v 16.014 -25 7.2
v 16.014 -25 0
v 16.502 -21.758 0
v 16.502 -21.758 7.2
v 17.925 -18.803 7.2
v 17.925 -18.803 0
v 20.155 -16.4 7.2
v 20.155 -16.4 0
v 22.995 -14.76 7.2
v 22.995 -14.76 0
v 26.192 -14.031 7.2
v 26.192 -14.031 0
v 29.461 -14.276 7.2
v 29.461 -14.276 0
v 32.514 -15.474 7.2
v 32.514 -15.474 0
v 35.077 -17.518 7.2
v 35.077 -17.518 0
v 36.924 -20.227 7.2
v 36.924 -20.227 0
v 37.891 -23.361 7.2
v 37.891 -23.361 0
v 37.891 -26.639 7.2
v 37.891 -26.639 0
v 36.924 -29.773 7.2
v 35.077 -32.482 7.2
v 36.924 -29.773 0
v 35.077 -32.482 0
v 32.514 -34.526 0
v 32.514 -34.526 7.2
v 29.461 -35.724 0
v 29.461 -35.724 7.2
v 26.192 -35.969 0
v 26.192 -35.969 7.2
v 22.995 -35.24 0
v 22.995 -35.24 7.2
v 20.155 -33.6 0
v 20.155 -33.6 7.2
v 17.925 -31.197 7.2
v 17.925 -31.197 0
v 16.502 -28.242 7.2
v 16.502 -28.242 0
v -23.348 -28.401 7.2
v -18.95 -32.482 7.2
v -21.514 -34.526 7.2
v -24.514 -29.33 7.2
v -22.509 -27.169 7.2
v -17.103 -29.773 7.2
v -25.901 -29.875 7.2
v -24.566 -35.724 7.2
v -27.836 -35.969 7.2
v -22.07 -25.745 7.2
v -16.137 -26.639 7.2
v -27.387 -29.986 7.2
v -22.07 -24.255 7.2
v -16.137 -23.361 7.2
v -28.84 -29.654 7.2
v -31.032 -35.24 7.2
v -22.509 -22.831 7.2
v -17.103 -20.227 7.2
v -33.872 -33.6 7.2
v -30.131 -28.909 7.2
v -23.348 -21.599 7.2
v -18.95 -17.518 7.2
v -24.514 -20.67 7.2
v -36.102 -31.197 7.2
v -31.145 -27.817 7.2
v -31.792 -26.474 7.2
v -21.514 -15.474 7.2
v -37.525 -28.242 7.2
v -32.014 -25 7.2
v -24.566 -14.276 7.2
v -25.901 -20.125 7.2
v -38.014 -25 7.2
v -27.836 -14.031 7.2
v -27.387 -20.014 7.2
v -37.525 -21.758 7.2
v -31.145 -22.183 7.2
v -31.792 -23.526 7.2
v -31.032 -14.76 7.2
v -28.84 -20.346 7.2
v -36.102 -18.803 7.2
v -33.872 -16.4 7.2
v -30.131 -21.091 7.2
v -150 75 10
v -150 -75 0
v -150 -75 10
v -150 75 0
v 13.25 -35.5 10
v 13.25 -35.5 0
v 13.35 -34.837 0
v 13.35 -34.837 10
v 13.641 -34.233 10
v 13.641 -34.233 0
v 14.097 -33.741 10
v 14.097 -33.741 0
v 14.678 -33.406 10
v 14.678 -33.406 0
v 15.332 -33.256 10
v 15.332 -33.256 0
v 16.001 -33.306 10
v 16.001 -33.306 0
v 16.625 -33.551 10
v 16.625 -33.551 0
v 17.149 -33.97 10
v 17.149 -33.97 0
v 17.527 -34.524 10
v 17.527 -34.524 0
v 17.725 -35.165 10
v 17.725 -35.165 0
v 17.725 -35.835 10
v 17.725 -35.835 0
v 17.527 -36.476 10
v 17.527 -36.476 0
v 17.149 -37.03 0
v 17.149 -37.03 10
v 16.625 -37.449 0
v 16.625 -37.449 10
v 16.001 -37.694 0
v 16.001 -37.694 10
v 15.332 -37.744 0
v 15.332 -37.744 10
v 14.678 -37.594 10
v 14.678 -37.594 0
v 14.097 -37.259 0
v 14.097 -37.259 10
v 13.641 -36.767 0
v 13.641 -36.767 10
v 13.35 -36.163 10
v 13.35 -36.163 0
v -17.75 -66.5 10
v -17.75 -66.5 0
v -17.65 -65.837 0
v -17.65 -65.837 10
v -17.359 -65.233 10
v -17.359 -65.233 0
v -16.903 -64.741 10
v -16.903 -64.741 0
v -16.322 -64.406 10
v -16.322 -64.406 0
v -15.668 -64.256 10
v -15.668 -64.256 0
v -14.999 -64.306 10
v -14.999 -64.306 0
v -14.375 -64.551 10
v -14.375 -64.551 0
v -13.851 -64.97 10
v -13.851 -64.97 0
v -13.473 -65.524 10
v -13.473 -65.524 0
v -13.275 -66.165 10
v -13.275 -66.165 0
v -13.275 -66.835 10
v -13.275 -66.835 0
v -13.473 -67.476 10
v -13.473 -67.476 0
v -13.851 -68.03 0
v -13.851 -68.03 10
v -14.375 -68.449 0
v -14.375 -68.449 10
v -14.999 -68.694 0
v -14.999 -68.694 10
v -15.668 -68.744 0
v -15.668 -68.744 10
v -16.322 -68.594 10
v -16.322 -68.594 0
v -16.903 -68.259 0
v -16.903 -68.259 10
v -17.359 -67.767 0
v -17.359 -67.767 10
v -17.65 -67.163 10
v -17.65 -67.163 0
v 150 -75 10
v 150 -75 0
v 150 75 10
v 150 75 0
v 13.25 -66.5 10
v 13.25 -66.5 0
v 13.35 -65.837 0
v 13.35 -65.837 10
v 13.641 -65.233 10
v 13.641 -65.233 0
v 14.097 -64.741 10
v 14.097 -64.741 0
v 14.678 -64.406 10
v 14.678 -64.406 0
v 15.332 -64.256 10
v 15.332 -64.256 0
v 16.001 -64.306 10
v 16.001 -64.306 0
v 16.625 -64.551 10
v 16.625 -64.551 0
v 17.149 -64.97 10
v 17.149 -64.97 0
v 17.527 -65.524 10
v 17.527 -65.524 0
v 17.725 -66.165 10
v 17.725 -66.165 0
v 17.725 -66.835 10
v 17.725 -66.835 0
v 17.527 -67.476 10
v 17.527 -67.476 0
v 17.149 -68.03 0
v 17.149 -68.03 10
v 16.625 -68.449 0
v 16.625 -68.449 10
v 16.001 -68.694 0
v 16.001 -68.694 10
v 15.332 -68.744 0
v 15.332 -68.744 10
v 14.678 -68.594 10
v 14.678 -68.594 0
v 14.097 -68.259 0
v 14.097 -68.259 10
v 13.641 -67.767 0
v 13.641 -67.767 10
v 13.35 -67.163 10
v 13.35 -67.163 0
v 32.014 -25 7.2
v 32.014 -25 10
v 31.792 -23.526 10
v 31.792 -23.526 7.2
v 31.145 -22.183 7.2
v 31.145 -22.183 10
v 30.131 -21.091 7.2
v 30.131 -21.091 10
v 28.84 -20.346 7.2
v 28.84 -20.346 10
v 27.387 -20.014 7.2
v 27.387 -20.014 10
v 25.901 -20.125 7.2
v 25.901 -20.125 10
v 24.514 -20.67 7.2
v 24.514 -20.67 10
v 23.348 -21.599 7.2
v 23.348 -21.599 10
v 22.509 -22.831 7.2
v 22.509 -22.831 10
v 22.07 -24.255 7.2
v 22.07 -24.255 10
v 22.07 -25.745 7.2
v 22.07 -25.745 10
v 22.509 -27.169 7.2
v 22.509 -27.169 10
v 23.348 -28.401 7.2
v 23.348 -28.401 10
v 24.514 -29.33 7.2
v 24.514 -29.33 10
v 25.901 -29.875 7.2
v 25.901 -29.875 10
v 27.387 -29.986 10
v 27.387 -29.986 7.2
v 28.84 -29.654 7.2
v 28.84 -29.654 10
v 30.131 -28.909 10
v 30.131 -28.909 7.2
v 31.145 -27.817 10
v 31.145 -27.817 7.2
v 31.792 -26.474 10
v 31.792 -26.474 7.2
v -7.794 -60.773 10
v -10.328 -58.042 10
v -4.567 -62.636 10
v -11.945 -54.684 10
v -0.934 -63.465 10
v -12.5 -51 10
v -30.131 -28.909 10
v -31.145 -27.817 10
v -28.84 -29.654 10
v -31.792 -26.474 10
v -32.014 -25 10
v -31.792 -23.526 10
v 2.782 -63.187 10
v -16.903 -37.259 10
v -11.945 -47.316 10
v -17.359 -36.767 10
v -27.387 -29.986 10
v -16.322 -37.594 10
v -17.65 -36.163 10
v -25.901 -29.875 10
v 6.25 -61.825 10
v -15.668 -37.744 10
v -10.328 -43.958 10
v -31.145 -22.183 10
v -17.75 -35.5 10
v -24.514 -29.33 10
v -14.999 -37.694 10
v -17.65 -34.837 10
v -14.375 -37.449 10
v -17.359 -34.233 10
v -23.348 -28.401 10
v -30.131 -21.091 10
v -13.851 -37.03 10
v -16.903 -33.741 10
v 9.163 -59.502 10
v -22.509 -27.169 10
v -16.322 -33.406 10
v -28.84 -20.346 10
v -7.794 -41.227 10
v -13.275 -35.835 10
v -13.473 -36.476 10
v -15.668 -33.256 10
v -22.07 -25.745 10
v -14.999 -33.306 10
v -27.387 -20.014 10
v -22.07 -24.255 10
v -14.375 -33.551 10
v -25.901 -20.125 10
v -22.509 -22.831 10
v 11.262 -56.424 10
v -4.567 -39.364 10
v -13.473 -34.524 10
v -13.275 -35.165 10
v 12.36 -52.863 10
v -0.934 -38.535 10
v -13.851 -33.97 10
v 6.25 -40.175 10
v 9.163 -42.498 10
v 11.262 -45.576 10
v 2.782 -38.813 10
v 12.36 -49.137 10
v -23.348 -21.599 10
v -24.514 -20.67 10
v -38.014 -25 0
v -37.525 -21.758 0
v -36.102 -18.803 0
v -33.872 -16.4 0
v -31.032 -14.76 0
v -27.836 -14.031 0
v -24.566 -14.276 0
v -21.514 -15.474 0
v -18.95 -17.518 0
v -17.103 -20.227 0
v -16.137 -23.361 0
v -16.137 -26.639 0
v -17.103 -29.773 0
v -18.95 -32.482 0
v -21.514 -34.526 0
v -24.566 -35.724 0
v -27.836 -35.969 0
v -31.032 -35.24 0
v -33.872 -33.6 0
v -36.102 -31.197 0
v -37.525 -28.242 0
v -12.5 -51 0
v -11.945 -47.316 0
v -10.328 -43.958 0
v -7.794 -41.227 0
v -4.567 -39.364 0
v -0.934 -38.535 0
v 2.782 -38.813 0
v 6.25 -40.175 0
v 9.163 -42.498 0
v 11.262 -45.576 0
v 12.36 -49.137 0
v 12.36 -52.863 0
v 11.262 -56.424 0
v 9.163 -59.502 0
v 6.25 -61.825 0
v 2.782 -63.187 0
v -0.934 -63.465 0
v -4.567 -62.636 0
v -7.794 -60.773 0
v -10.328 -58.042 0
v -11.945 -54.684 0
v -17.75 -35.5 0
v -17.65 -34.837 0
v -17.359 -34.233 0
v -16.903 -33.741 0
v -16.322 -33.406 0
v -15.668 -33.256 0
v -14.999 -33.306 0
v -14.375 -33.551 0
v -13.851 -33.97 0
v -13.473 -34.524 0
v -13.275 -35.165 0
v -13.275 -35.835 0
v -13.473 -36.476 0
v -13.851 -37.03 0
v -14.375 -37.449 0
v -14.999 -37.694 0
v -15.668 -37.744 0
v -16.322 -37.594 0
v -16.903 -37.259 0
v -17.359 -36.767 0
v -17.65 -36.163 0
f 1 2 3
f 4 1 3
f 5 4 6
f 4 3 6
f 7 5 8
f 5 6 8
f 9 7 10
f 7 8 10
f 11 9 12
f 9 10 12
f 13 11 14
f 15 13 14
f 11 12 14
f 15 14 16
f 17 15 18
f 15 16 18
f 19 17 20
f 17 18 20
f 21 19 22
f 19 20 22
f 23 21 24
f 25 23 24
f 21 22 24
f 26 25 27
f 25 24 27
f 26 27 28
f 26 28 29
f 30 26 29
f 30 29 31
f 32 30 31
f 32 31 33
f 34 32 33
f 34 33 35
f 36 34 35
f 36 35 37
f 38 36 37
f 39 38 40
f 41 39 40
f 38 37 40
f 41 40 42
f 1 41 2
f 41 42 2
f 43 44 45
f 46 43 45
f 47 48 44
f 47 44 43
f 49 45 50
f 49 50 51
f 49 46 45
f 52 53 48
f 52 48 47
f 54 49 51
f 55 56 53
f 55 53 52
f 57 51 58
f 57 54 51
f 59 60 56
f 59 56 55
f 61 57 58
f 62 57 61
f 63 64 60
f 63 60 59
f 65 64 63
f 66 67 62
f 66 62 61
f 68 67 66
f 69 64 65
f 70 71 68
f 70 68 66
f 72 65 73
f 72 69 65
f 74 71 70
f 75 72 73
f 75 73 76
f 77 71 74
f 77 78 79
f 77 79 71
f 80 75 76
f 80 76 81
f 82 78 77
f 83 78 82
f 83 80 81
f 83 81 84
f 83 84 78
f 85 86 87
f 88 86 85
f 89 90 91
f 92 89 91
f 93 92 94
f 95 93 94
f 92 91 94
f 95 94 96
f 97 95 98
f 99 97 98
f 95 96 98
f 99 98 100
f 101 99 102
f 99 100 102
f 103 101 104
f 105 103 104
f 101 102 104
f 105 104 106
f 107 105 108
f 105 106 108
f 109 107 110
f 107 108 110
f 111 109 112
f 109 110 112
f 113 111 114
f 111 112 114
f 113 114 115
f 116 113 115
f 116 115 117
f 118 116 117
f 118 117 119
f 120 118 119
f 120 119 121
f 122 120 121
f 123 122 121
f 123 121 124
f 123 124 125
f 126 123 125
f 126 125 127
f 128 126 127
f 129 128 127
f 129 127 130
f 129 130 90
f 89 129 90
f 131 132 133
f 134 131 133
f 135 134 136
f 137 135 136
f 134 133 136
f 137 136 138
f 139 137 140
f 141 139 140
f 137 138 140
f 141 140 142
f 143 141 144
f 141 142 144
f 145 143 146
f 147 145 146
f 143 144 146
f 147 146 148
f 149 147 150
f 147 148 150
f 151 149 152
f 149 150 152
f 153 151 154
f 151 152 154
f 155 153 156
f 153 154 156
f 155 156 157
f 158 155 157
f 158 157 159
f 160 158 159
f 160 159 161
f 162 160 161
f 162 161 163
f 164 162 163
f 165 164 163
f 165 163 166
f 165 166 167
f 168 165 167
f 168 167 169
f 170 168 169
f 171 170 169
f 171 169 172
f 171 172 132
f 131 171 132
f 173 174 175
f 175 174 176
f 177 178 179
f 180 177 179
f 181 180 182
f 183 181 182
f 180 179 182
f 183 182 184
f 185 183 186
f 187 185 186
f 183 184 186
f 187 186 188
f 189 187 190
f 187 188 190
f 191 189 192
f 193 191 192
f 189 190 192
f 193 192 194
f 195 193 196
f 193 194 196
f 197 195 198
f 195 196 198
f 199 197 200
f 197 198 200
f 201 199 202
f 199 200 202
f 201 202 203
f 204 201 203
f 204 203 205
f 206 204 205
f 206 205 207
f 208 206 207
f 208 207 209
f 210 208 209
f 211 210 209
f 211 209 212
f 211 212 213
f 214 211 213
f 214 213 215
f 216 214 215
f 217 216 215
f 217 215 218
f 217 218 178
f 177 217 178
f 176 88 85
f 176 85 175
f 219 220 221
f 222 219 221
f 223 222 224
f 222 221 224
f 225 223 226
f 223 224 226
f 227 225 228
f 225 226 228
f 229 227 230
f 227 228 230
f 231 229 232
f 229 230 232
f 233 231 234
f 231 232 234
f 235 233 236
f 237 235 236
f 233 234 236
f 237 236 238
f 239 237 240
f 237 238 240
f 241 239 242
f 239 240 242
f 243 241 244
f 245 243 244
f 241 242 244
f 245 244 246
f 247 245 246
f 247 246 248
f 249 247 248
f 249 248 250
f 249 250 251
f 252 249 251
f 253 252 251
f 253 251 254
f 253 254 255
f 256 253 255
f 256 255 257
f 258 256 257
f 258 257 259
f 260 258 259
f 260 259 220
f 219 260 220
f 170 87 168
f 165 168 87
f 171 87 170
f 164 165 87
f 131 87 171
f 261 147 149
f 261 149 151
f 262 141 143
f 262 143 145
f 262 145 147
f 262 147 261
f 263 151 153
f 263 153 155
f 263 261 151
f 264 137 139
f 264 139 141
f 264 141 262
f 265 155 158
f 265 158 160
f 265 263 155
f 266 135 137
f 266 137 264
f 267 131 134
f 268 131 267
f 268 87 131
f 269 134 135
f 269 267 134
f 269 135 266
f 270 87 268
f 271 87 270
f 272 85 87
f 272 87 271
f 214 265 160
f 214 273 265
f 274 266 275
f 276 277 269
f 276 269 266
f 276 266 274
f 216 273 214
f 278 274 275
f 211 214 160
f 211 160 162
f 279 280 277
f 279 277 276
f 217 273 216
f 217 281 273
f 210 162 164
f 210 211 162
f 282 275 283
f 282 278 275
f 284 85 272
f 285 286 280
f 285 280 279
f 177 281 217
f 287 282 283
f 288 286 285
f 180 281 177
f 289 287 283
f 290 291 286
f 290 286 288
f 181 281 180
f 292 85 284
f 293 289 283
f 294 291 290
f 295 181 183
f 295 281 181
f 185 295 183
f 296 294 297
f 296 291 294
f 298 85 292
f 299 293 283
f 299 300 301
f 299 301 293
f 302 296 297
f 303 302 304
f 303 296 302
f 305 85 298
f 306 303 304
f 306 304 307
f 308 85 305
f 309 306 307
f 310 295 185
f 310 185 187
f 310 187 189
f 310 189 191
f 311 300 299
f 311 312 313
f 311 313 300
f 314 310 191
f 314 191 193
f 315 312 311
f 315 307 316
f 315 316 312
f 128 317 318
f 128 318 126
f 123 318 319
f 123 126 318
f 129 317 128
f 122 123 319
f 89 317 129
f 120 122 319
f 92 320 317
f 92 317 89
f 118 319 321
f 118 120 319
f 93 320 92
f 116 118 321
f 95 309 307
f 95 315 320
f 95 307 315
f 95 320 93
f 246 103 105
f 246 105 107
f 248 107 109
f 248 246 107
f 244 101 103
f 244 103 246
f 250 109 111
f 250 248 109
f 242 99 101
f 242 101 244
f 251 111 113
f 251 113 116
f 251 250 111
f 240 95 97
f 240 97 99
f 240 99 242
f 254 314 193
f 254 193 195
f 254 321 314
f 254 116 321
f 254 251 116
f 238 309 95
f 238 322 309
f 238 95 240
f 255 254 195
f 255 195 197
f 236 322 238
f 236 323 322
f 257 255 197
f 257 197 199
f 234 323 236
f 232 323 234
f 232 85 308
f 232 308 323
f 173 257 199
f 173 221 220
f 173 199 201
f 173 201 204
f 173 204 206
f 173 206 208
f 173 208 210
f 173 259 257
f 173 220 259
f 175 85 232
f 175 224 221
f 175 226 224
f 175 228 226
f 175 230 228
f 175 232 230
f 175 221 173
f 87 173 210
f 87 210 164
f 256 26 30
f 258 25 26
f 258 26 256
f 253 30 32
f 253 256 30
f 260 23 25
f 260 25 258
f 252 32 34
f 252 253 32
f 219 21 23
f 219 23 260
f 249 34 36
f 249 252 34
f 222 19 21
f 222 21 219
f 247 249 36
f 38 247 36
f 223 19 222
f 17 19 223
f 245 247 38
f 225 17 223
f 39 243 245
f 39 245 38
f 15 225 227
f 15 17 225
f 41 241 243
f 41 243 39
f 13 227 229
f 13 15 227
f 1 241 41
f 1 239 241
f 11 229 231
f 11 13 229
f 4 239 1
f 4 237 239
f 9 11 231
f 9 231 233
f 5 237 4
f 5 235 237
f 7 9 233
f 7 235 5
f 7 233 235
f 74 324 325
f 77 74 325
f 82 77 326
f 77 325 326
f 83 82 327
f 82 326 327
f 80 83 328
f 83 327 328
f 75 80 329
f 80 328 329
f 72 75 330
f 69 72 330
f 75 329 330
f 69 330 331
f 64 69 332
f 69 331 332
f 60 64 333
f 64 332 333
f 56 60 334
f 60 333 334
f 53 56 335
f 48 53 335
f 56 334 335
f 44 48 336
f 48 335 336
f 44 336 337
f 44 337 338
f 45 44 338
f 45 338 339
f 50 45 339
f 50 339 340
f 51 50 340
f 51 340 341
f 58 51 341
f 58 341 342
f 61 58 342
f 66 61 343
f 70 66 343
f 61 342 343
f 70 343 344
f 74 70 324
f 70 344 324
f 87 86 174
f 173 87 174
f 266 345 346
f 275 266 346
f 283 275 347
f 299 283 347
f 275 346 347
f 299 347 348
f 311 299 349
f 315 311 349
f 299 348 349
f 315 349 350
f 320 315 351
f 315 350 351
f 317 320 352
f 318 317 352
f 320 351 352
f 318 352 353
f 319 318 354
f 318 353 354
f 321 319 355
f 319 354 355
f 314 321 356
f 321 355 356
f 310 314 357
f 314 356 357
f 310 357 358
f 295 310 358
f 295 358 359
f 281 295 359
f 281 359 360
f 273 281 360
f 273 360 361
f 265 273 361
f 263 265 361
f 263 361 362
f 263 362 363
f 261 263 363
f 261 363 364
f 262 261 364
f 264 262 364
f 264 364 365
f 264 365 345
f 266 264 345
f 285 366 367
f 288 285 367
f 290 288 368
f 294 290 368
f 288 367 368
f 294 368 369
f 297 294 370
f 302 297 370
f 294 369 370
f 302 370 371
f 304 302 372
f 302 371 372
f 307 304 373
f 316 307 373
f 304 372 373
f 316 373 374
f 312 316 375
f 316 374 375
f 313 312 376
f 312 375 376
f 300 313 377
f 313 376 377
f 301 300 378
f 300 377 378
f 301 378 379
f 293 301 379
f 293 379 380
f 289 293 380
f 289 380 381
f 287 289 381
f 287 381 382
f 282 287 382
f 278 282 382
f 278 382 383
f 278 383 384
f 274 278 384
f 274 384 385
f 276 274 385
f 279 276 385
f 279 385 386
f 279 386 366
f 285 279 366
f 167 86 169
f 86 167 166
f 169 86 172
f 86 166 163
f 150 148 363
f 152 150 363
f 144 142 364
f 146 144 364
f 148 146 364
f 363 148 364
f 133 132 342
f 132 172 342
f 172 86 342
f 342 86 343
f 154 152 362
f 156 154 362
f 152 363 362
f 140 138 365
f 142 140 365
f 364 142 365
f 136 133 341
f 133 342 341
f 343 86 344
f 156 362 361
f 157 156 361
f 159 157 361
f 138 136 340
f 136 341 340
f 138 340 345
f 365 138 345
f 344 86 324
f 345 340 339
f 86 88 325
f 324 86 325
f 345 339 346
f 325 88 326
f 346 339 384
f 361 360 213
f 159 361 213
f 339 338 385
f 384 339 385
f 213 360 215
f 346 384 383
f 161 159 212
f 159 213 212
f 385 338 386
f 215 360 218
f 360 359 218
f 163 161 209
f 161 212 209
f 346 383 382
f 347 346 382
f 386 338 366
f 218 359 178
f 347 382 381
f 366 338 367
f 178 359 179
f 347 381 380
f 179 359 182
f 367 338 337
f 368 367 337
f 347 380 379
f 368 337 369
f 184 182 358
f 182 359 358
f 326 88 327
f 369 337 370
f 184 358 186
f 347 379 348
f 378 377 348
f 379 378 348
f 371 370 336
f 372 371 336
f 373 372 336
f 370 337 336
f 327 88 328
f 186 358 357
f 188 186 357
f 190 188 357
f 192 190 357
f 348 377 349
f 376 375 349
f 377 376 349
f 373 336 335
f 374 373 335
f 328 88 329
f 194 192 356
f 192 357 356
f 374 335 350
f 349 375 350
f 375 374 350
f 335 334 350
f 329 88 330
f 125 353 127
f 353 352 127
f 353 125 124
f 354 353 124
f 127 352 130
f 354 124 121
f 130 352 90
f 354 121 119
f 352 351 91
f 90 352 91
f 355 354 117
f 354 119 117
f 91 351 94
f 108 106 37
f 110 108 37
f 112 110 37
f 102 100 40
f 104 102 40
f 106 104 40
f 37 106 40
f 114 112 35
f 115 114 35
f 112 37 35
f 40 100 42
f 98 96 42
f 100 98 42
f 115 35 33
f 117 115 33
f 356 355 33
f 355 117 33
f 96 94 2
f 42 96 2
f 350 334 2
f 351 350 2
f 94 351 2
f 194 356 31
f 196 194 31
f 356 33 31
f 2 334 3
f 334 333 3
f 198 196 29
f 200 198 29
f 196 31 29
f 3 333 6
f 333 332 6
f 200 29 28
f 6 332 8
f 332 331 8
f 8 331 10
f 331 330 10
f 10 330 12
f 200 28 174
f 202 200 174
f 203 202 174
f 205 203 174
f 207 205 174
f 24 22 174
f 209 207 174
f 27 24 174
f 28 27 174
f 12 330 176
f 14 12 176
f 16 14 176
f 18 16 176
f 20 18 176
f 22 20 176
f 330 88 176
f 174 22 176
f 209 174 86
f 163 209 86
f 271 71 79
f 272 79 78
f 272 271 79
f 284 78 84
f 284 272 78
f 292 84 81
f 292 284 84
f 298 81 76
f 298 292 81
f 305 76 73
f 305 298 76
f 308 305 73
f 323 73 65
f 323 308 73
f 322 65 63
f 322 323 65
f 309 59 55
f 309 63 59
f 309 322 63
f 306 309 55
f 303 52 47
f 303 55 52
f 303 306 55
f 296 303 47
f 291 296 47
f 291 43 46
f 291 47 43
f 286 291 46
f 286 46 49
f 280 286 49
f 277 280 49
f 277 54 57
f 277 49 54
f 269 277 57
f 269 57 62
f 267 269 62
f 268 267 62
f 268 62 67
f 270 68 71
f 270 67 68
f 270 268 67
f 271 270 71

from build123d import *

# Parameters (mm, degrees)
SKETCH1_W                = 300
SKETCH1_H                = 150
BOSS_EXTRUDE1_DEPTH      = 10
SKETCH2_R                = 12.5
CUT_EXTRUDE1_DEPTH       = 169.002976164
M4_CLEARANCE_HOLE1_D     = 4.5
M4_CLEARANCE_HOLE1_DEPTH = 21
M4_CLEARANCE_HOLE1_TIP   = 1.351936393
SKETCH5_R                = 5
CUT_EXTRUDE2_DEPTH       = 169.002976164
SKETCH6_R                = 11
CUT_EXTRUDE3_DEPTH       = 7.2


with BuildPart() as part:
    # Sketch1 → Boss-Extrude1 (new body)
    with BuildSketch(Plane.XY):
        Rectangle(SKETCH1_W, SKETCH1_H)
    extrude(amount=BOSS_EXTRUDE1_DEPTH)

    # Sketch2 → Cut-Extrude1 (cut, through all)
    with BuildSketch(Plane(origin=(0, 0, 0), x_dir=(-1, 0, 0), z_dir=(0, 0, -1))):
        with Locations((0, -51)):
            Circle(SKETCH2_R)
    extrude(amount=-CUT_EXTRUDE1_DEPTH, mode=Mode.SUBTRACT)

    # M4 Clearance Hole1
    with Locations(Plane.XY.offset(10)):
        with Locations((-15.5, -35.5), (15.5, -35.5), (15.5, -66.5), (-15.5, -66.5)):
            Hole(M4_CLEARANCE_HOLE1_D / 2, depth=M4_CLEARANCE_HOLE1_DEPTH)
            with Locations((0, 0, -(M4_CLEARANCE_HOLE1_DEPTH + M4_CLEARANCE_HOLE1_TIP / 2))):  # 118° drill point
                Cone(0, M4_CLEARANCE_HOLE1_D / 2, M4_CLEARANCE_HOLE1_TIP, mode=Mode.SUBTRACT)

    # Sketch5 → Cut-Extrude2 (cut, through all)
    with BuildSketch(Plane.XY.offset(10)):
        with Locations((27.013718503, -25)):
            Circle(SKETCH5_R)
    cut_extrude2 = extrude(amount=-CUT_EXTRUDE2_DEPTH, mode=Mode.SUBTRACT)

    # Mirror1: Cut-Extrude2 across plane
    add(cut_extrude2.mirror(Plane(origin=(0, 0, 0), x_dir=(0, 0, 1), z_dir=(1, 0, 0))), mode=Mode.SUBTRACT)

    # Sketch6 → Cut-Extrude3 (cut)
    with BuildSketch(Plane(origin=(0, 0, 0), x_dir=(-1, 0, 0), z_dir=(0, 0, -1))):
        with Locations((-27.013718503, -25)):
            Circle(SKETCH6_R)
        with Locations((27.013718503, -25)):
            Circle(SKETCH6_R)
    extrude(amount=-CUT_EXTRUDE3_DEPTH, mode=Mode.SUBTRACT)


solid = part.part
